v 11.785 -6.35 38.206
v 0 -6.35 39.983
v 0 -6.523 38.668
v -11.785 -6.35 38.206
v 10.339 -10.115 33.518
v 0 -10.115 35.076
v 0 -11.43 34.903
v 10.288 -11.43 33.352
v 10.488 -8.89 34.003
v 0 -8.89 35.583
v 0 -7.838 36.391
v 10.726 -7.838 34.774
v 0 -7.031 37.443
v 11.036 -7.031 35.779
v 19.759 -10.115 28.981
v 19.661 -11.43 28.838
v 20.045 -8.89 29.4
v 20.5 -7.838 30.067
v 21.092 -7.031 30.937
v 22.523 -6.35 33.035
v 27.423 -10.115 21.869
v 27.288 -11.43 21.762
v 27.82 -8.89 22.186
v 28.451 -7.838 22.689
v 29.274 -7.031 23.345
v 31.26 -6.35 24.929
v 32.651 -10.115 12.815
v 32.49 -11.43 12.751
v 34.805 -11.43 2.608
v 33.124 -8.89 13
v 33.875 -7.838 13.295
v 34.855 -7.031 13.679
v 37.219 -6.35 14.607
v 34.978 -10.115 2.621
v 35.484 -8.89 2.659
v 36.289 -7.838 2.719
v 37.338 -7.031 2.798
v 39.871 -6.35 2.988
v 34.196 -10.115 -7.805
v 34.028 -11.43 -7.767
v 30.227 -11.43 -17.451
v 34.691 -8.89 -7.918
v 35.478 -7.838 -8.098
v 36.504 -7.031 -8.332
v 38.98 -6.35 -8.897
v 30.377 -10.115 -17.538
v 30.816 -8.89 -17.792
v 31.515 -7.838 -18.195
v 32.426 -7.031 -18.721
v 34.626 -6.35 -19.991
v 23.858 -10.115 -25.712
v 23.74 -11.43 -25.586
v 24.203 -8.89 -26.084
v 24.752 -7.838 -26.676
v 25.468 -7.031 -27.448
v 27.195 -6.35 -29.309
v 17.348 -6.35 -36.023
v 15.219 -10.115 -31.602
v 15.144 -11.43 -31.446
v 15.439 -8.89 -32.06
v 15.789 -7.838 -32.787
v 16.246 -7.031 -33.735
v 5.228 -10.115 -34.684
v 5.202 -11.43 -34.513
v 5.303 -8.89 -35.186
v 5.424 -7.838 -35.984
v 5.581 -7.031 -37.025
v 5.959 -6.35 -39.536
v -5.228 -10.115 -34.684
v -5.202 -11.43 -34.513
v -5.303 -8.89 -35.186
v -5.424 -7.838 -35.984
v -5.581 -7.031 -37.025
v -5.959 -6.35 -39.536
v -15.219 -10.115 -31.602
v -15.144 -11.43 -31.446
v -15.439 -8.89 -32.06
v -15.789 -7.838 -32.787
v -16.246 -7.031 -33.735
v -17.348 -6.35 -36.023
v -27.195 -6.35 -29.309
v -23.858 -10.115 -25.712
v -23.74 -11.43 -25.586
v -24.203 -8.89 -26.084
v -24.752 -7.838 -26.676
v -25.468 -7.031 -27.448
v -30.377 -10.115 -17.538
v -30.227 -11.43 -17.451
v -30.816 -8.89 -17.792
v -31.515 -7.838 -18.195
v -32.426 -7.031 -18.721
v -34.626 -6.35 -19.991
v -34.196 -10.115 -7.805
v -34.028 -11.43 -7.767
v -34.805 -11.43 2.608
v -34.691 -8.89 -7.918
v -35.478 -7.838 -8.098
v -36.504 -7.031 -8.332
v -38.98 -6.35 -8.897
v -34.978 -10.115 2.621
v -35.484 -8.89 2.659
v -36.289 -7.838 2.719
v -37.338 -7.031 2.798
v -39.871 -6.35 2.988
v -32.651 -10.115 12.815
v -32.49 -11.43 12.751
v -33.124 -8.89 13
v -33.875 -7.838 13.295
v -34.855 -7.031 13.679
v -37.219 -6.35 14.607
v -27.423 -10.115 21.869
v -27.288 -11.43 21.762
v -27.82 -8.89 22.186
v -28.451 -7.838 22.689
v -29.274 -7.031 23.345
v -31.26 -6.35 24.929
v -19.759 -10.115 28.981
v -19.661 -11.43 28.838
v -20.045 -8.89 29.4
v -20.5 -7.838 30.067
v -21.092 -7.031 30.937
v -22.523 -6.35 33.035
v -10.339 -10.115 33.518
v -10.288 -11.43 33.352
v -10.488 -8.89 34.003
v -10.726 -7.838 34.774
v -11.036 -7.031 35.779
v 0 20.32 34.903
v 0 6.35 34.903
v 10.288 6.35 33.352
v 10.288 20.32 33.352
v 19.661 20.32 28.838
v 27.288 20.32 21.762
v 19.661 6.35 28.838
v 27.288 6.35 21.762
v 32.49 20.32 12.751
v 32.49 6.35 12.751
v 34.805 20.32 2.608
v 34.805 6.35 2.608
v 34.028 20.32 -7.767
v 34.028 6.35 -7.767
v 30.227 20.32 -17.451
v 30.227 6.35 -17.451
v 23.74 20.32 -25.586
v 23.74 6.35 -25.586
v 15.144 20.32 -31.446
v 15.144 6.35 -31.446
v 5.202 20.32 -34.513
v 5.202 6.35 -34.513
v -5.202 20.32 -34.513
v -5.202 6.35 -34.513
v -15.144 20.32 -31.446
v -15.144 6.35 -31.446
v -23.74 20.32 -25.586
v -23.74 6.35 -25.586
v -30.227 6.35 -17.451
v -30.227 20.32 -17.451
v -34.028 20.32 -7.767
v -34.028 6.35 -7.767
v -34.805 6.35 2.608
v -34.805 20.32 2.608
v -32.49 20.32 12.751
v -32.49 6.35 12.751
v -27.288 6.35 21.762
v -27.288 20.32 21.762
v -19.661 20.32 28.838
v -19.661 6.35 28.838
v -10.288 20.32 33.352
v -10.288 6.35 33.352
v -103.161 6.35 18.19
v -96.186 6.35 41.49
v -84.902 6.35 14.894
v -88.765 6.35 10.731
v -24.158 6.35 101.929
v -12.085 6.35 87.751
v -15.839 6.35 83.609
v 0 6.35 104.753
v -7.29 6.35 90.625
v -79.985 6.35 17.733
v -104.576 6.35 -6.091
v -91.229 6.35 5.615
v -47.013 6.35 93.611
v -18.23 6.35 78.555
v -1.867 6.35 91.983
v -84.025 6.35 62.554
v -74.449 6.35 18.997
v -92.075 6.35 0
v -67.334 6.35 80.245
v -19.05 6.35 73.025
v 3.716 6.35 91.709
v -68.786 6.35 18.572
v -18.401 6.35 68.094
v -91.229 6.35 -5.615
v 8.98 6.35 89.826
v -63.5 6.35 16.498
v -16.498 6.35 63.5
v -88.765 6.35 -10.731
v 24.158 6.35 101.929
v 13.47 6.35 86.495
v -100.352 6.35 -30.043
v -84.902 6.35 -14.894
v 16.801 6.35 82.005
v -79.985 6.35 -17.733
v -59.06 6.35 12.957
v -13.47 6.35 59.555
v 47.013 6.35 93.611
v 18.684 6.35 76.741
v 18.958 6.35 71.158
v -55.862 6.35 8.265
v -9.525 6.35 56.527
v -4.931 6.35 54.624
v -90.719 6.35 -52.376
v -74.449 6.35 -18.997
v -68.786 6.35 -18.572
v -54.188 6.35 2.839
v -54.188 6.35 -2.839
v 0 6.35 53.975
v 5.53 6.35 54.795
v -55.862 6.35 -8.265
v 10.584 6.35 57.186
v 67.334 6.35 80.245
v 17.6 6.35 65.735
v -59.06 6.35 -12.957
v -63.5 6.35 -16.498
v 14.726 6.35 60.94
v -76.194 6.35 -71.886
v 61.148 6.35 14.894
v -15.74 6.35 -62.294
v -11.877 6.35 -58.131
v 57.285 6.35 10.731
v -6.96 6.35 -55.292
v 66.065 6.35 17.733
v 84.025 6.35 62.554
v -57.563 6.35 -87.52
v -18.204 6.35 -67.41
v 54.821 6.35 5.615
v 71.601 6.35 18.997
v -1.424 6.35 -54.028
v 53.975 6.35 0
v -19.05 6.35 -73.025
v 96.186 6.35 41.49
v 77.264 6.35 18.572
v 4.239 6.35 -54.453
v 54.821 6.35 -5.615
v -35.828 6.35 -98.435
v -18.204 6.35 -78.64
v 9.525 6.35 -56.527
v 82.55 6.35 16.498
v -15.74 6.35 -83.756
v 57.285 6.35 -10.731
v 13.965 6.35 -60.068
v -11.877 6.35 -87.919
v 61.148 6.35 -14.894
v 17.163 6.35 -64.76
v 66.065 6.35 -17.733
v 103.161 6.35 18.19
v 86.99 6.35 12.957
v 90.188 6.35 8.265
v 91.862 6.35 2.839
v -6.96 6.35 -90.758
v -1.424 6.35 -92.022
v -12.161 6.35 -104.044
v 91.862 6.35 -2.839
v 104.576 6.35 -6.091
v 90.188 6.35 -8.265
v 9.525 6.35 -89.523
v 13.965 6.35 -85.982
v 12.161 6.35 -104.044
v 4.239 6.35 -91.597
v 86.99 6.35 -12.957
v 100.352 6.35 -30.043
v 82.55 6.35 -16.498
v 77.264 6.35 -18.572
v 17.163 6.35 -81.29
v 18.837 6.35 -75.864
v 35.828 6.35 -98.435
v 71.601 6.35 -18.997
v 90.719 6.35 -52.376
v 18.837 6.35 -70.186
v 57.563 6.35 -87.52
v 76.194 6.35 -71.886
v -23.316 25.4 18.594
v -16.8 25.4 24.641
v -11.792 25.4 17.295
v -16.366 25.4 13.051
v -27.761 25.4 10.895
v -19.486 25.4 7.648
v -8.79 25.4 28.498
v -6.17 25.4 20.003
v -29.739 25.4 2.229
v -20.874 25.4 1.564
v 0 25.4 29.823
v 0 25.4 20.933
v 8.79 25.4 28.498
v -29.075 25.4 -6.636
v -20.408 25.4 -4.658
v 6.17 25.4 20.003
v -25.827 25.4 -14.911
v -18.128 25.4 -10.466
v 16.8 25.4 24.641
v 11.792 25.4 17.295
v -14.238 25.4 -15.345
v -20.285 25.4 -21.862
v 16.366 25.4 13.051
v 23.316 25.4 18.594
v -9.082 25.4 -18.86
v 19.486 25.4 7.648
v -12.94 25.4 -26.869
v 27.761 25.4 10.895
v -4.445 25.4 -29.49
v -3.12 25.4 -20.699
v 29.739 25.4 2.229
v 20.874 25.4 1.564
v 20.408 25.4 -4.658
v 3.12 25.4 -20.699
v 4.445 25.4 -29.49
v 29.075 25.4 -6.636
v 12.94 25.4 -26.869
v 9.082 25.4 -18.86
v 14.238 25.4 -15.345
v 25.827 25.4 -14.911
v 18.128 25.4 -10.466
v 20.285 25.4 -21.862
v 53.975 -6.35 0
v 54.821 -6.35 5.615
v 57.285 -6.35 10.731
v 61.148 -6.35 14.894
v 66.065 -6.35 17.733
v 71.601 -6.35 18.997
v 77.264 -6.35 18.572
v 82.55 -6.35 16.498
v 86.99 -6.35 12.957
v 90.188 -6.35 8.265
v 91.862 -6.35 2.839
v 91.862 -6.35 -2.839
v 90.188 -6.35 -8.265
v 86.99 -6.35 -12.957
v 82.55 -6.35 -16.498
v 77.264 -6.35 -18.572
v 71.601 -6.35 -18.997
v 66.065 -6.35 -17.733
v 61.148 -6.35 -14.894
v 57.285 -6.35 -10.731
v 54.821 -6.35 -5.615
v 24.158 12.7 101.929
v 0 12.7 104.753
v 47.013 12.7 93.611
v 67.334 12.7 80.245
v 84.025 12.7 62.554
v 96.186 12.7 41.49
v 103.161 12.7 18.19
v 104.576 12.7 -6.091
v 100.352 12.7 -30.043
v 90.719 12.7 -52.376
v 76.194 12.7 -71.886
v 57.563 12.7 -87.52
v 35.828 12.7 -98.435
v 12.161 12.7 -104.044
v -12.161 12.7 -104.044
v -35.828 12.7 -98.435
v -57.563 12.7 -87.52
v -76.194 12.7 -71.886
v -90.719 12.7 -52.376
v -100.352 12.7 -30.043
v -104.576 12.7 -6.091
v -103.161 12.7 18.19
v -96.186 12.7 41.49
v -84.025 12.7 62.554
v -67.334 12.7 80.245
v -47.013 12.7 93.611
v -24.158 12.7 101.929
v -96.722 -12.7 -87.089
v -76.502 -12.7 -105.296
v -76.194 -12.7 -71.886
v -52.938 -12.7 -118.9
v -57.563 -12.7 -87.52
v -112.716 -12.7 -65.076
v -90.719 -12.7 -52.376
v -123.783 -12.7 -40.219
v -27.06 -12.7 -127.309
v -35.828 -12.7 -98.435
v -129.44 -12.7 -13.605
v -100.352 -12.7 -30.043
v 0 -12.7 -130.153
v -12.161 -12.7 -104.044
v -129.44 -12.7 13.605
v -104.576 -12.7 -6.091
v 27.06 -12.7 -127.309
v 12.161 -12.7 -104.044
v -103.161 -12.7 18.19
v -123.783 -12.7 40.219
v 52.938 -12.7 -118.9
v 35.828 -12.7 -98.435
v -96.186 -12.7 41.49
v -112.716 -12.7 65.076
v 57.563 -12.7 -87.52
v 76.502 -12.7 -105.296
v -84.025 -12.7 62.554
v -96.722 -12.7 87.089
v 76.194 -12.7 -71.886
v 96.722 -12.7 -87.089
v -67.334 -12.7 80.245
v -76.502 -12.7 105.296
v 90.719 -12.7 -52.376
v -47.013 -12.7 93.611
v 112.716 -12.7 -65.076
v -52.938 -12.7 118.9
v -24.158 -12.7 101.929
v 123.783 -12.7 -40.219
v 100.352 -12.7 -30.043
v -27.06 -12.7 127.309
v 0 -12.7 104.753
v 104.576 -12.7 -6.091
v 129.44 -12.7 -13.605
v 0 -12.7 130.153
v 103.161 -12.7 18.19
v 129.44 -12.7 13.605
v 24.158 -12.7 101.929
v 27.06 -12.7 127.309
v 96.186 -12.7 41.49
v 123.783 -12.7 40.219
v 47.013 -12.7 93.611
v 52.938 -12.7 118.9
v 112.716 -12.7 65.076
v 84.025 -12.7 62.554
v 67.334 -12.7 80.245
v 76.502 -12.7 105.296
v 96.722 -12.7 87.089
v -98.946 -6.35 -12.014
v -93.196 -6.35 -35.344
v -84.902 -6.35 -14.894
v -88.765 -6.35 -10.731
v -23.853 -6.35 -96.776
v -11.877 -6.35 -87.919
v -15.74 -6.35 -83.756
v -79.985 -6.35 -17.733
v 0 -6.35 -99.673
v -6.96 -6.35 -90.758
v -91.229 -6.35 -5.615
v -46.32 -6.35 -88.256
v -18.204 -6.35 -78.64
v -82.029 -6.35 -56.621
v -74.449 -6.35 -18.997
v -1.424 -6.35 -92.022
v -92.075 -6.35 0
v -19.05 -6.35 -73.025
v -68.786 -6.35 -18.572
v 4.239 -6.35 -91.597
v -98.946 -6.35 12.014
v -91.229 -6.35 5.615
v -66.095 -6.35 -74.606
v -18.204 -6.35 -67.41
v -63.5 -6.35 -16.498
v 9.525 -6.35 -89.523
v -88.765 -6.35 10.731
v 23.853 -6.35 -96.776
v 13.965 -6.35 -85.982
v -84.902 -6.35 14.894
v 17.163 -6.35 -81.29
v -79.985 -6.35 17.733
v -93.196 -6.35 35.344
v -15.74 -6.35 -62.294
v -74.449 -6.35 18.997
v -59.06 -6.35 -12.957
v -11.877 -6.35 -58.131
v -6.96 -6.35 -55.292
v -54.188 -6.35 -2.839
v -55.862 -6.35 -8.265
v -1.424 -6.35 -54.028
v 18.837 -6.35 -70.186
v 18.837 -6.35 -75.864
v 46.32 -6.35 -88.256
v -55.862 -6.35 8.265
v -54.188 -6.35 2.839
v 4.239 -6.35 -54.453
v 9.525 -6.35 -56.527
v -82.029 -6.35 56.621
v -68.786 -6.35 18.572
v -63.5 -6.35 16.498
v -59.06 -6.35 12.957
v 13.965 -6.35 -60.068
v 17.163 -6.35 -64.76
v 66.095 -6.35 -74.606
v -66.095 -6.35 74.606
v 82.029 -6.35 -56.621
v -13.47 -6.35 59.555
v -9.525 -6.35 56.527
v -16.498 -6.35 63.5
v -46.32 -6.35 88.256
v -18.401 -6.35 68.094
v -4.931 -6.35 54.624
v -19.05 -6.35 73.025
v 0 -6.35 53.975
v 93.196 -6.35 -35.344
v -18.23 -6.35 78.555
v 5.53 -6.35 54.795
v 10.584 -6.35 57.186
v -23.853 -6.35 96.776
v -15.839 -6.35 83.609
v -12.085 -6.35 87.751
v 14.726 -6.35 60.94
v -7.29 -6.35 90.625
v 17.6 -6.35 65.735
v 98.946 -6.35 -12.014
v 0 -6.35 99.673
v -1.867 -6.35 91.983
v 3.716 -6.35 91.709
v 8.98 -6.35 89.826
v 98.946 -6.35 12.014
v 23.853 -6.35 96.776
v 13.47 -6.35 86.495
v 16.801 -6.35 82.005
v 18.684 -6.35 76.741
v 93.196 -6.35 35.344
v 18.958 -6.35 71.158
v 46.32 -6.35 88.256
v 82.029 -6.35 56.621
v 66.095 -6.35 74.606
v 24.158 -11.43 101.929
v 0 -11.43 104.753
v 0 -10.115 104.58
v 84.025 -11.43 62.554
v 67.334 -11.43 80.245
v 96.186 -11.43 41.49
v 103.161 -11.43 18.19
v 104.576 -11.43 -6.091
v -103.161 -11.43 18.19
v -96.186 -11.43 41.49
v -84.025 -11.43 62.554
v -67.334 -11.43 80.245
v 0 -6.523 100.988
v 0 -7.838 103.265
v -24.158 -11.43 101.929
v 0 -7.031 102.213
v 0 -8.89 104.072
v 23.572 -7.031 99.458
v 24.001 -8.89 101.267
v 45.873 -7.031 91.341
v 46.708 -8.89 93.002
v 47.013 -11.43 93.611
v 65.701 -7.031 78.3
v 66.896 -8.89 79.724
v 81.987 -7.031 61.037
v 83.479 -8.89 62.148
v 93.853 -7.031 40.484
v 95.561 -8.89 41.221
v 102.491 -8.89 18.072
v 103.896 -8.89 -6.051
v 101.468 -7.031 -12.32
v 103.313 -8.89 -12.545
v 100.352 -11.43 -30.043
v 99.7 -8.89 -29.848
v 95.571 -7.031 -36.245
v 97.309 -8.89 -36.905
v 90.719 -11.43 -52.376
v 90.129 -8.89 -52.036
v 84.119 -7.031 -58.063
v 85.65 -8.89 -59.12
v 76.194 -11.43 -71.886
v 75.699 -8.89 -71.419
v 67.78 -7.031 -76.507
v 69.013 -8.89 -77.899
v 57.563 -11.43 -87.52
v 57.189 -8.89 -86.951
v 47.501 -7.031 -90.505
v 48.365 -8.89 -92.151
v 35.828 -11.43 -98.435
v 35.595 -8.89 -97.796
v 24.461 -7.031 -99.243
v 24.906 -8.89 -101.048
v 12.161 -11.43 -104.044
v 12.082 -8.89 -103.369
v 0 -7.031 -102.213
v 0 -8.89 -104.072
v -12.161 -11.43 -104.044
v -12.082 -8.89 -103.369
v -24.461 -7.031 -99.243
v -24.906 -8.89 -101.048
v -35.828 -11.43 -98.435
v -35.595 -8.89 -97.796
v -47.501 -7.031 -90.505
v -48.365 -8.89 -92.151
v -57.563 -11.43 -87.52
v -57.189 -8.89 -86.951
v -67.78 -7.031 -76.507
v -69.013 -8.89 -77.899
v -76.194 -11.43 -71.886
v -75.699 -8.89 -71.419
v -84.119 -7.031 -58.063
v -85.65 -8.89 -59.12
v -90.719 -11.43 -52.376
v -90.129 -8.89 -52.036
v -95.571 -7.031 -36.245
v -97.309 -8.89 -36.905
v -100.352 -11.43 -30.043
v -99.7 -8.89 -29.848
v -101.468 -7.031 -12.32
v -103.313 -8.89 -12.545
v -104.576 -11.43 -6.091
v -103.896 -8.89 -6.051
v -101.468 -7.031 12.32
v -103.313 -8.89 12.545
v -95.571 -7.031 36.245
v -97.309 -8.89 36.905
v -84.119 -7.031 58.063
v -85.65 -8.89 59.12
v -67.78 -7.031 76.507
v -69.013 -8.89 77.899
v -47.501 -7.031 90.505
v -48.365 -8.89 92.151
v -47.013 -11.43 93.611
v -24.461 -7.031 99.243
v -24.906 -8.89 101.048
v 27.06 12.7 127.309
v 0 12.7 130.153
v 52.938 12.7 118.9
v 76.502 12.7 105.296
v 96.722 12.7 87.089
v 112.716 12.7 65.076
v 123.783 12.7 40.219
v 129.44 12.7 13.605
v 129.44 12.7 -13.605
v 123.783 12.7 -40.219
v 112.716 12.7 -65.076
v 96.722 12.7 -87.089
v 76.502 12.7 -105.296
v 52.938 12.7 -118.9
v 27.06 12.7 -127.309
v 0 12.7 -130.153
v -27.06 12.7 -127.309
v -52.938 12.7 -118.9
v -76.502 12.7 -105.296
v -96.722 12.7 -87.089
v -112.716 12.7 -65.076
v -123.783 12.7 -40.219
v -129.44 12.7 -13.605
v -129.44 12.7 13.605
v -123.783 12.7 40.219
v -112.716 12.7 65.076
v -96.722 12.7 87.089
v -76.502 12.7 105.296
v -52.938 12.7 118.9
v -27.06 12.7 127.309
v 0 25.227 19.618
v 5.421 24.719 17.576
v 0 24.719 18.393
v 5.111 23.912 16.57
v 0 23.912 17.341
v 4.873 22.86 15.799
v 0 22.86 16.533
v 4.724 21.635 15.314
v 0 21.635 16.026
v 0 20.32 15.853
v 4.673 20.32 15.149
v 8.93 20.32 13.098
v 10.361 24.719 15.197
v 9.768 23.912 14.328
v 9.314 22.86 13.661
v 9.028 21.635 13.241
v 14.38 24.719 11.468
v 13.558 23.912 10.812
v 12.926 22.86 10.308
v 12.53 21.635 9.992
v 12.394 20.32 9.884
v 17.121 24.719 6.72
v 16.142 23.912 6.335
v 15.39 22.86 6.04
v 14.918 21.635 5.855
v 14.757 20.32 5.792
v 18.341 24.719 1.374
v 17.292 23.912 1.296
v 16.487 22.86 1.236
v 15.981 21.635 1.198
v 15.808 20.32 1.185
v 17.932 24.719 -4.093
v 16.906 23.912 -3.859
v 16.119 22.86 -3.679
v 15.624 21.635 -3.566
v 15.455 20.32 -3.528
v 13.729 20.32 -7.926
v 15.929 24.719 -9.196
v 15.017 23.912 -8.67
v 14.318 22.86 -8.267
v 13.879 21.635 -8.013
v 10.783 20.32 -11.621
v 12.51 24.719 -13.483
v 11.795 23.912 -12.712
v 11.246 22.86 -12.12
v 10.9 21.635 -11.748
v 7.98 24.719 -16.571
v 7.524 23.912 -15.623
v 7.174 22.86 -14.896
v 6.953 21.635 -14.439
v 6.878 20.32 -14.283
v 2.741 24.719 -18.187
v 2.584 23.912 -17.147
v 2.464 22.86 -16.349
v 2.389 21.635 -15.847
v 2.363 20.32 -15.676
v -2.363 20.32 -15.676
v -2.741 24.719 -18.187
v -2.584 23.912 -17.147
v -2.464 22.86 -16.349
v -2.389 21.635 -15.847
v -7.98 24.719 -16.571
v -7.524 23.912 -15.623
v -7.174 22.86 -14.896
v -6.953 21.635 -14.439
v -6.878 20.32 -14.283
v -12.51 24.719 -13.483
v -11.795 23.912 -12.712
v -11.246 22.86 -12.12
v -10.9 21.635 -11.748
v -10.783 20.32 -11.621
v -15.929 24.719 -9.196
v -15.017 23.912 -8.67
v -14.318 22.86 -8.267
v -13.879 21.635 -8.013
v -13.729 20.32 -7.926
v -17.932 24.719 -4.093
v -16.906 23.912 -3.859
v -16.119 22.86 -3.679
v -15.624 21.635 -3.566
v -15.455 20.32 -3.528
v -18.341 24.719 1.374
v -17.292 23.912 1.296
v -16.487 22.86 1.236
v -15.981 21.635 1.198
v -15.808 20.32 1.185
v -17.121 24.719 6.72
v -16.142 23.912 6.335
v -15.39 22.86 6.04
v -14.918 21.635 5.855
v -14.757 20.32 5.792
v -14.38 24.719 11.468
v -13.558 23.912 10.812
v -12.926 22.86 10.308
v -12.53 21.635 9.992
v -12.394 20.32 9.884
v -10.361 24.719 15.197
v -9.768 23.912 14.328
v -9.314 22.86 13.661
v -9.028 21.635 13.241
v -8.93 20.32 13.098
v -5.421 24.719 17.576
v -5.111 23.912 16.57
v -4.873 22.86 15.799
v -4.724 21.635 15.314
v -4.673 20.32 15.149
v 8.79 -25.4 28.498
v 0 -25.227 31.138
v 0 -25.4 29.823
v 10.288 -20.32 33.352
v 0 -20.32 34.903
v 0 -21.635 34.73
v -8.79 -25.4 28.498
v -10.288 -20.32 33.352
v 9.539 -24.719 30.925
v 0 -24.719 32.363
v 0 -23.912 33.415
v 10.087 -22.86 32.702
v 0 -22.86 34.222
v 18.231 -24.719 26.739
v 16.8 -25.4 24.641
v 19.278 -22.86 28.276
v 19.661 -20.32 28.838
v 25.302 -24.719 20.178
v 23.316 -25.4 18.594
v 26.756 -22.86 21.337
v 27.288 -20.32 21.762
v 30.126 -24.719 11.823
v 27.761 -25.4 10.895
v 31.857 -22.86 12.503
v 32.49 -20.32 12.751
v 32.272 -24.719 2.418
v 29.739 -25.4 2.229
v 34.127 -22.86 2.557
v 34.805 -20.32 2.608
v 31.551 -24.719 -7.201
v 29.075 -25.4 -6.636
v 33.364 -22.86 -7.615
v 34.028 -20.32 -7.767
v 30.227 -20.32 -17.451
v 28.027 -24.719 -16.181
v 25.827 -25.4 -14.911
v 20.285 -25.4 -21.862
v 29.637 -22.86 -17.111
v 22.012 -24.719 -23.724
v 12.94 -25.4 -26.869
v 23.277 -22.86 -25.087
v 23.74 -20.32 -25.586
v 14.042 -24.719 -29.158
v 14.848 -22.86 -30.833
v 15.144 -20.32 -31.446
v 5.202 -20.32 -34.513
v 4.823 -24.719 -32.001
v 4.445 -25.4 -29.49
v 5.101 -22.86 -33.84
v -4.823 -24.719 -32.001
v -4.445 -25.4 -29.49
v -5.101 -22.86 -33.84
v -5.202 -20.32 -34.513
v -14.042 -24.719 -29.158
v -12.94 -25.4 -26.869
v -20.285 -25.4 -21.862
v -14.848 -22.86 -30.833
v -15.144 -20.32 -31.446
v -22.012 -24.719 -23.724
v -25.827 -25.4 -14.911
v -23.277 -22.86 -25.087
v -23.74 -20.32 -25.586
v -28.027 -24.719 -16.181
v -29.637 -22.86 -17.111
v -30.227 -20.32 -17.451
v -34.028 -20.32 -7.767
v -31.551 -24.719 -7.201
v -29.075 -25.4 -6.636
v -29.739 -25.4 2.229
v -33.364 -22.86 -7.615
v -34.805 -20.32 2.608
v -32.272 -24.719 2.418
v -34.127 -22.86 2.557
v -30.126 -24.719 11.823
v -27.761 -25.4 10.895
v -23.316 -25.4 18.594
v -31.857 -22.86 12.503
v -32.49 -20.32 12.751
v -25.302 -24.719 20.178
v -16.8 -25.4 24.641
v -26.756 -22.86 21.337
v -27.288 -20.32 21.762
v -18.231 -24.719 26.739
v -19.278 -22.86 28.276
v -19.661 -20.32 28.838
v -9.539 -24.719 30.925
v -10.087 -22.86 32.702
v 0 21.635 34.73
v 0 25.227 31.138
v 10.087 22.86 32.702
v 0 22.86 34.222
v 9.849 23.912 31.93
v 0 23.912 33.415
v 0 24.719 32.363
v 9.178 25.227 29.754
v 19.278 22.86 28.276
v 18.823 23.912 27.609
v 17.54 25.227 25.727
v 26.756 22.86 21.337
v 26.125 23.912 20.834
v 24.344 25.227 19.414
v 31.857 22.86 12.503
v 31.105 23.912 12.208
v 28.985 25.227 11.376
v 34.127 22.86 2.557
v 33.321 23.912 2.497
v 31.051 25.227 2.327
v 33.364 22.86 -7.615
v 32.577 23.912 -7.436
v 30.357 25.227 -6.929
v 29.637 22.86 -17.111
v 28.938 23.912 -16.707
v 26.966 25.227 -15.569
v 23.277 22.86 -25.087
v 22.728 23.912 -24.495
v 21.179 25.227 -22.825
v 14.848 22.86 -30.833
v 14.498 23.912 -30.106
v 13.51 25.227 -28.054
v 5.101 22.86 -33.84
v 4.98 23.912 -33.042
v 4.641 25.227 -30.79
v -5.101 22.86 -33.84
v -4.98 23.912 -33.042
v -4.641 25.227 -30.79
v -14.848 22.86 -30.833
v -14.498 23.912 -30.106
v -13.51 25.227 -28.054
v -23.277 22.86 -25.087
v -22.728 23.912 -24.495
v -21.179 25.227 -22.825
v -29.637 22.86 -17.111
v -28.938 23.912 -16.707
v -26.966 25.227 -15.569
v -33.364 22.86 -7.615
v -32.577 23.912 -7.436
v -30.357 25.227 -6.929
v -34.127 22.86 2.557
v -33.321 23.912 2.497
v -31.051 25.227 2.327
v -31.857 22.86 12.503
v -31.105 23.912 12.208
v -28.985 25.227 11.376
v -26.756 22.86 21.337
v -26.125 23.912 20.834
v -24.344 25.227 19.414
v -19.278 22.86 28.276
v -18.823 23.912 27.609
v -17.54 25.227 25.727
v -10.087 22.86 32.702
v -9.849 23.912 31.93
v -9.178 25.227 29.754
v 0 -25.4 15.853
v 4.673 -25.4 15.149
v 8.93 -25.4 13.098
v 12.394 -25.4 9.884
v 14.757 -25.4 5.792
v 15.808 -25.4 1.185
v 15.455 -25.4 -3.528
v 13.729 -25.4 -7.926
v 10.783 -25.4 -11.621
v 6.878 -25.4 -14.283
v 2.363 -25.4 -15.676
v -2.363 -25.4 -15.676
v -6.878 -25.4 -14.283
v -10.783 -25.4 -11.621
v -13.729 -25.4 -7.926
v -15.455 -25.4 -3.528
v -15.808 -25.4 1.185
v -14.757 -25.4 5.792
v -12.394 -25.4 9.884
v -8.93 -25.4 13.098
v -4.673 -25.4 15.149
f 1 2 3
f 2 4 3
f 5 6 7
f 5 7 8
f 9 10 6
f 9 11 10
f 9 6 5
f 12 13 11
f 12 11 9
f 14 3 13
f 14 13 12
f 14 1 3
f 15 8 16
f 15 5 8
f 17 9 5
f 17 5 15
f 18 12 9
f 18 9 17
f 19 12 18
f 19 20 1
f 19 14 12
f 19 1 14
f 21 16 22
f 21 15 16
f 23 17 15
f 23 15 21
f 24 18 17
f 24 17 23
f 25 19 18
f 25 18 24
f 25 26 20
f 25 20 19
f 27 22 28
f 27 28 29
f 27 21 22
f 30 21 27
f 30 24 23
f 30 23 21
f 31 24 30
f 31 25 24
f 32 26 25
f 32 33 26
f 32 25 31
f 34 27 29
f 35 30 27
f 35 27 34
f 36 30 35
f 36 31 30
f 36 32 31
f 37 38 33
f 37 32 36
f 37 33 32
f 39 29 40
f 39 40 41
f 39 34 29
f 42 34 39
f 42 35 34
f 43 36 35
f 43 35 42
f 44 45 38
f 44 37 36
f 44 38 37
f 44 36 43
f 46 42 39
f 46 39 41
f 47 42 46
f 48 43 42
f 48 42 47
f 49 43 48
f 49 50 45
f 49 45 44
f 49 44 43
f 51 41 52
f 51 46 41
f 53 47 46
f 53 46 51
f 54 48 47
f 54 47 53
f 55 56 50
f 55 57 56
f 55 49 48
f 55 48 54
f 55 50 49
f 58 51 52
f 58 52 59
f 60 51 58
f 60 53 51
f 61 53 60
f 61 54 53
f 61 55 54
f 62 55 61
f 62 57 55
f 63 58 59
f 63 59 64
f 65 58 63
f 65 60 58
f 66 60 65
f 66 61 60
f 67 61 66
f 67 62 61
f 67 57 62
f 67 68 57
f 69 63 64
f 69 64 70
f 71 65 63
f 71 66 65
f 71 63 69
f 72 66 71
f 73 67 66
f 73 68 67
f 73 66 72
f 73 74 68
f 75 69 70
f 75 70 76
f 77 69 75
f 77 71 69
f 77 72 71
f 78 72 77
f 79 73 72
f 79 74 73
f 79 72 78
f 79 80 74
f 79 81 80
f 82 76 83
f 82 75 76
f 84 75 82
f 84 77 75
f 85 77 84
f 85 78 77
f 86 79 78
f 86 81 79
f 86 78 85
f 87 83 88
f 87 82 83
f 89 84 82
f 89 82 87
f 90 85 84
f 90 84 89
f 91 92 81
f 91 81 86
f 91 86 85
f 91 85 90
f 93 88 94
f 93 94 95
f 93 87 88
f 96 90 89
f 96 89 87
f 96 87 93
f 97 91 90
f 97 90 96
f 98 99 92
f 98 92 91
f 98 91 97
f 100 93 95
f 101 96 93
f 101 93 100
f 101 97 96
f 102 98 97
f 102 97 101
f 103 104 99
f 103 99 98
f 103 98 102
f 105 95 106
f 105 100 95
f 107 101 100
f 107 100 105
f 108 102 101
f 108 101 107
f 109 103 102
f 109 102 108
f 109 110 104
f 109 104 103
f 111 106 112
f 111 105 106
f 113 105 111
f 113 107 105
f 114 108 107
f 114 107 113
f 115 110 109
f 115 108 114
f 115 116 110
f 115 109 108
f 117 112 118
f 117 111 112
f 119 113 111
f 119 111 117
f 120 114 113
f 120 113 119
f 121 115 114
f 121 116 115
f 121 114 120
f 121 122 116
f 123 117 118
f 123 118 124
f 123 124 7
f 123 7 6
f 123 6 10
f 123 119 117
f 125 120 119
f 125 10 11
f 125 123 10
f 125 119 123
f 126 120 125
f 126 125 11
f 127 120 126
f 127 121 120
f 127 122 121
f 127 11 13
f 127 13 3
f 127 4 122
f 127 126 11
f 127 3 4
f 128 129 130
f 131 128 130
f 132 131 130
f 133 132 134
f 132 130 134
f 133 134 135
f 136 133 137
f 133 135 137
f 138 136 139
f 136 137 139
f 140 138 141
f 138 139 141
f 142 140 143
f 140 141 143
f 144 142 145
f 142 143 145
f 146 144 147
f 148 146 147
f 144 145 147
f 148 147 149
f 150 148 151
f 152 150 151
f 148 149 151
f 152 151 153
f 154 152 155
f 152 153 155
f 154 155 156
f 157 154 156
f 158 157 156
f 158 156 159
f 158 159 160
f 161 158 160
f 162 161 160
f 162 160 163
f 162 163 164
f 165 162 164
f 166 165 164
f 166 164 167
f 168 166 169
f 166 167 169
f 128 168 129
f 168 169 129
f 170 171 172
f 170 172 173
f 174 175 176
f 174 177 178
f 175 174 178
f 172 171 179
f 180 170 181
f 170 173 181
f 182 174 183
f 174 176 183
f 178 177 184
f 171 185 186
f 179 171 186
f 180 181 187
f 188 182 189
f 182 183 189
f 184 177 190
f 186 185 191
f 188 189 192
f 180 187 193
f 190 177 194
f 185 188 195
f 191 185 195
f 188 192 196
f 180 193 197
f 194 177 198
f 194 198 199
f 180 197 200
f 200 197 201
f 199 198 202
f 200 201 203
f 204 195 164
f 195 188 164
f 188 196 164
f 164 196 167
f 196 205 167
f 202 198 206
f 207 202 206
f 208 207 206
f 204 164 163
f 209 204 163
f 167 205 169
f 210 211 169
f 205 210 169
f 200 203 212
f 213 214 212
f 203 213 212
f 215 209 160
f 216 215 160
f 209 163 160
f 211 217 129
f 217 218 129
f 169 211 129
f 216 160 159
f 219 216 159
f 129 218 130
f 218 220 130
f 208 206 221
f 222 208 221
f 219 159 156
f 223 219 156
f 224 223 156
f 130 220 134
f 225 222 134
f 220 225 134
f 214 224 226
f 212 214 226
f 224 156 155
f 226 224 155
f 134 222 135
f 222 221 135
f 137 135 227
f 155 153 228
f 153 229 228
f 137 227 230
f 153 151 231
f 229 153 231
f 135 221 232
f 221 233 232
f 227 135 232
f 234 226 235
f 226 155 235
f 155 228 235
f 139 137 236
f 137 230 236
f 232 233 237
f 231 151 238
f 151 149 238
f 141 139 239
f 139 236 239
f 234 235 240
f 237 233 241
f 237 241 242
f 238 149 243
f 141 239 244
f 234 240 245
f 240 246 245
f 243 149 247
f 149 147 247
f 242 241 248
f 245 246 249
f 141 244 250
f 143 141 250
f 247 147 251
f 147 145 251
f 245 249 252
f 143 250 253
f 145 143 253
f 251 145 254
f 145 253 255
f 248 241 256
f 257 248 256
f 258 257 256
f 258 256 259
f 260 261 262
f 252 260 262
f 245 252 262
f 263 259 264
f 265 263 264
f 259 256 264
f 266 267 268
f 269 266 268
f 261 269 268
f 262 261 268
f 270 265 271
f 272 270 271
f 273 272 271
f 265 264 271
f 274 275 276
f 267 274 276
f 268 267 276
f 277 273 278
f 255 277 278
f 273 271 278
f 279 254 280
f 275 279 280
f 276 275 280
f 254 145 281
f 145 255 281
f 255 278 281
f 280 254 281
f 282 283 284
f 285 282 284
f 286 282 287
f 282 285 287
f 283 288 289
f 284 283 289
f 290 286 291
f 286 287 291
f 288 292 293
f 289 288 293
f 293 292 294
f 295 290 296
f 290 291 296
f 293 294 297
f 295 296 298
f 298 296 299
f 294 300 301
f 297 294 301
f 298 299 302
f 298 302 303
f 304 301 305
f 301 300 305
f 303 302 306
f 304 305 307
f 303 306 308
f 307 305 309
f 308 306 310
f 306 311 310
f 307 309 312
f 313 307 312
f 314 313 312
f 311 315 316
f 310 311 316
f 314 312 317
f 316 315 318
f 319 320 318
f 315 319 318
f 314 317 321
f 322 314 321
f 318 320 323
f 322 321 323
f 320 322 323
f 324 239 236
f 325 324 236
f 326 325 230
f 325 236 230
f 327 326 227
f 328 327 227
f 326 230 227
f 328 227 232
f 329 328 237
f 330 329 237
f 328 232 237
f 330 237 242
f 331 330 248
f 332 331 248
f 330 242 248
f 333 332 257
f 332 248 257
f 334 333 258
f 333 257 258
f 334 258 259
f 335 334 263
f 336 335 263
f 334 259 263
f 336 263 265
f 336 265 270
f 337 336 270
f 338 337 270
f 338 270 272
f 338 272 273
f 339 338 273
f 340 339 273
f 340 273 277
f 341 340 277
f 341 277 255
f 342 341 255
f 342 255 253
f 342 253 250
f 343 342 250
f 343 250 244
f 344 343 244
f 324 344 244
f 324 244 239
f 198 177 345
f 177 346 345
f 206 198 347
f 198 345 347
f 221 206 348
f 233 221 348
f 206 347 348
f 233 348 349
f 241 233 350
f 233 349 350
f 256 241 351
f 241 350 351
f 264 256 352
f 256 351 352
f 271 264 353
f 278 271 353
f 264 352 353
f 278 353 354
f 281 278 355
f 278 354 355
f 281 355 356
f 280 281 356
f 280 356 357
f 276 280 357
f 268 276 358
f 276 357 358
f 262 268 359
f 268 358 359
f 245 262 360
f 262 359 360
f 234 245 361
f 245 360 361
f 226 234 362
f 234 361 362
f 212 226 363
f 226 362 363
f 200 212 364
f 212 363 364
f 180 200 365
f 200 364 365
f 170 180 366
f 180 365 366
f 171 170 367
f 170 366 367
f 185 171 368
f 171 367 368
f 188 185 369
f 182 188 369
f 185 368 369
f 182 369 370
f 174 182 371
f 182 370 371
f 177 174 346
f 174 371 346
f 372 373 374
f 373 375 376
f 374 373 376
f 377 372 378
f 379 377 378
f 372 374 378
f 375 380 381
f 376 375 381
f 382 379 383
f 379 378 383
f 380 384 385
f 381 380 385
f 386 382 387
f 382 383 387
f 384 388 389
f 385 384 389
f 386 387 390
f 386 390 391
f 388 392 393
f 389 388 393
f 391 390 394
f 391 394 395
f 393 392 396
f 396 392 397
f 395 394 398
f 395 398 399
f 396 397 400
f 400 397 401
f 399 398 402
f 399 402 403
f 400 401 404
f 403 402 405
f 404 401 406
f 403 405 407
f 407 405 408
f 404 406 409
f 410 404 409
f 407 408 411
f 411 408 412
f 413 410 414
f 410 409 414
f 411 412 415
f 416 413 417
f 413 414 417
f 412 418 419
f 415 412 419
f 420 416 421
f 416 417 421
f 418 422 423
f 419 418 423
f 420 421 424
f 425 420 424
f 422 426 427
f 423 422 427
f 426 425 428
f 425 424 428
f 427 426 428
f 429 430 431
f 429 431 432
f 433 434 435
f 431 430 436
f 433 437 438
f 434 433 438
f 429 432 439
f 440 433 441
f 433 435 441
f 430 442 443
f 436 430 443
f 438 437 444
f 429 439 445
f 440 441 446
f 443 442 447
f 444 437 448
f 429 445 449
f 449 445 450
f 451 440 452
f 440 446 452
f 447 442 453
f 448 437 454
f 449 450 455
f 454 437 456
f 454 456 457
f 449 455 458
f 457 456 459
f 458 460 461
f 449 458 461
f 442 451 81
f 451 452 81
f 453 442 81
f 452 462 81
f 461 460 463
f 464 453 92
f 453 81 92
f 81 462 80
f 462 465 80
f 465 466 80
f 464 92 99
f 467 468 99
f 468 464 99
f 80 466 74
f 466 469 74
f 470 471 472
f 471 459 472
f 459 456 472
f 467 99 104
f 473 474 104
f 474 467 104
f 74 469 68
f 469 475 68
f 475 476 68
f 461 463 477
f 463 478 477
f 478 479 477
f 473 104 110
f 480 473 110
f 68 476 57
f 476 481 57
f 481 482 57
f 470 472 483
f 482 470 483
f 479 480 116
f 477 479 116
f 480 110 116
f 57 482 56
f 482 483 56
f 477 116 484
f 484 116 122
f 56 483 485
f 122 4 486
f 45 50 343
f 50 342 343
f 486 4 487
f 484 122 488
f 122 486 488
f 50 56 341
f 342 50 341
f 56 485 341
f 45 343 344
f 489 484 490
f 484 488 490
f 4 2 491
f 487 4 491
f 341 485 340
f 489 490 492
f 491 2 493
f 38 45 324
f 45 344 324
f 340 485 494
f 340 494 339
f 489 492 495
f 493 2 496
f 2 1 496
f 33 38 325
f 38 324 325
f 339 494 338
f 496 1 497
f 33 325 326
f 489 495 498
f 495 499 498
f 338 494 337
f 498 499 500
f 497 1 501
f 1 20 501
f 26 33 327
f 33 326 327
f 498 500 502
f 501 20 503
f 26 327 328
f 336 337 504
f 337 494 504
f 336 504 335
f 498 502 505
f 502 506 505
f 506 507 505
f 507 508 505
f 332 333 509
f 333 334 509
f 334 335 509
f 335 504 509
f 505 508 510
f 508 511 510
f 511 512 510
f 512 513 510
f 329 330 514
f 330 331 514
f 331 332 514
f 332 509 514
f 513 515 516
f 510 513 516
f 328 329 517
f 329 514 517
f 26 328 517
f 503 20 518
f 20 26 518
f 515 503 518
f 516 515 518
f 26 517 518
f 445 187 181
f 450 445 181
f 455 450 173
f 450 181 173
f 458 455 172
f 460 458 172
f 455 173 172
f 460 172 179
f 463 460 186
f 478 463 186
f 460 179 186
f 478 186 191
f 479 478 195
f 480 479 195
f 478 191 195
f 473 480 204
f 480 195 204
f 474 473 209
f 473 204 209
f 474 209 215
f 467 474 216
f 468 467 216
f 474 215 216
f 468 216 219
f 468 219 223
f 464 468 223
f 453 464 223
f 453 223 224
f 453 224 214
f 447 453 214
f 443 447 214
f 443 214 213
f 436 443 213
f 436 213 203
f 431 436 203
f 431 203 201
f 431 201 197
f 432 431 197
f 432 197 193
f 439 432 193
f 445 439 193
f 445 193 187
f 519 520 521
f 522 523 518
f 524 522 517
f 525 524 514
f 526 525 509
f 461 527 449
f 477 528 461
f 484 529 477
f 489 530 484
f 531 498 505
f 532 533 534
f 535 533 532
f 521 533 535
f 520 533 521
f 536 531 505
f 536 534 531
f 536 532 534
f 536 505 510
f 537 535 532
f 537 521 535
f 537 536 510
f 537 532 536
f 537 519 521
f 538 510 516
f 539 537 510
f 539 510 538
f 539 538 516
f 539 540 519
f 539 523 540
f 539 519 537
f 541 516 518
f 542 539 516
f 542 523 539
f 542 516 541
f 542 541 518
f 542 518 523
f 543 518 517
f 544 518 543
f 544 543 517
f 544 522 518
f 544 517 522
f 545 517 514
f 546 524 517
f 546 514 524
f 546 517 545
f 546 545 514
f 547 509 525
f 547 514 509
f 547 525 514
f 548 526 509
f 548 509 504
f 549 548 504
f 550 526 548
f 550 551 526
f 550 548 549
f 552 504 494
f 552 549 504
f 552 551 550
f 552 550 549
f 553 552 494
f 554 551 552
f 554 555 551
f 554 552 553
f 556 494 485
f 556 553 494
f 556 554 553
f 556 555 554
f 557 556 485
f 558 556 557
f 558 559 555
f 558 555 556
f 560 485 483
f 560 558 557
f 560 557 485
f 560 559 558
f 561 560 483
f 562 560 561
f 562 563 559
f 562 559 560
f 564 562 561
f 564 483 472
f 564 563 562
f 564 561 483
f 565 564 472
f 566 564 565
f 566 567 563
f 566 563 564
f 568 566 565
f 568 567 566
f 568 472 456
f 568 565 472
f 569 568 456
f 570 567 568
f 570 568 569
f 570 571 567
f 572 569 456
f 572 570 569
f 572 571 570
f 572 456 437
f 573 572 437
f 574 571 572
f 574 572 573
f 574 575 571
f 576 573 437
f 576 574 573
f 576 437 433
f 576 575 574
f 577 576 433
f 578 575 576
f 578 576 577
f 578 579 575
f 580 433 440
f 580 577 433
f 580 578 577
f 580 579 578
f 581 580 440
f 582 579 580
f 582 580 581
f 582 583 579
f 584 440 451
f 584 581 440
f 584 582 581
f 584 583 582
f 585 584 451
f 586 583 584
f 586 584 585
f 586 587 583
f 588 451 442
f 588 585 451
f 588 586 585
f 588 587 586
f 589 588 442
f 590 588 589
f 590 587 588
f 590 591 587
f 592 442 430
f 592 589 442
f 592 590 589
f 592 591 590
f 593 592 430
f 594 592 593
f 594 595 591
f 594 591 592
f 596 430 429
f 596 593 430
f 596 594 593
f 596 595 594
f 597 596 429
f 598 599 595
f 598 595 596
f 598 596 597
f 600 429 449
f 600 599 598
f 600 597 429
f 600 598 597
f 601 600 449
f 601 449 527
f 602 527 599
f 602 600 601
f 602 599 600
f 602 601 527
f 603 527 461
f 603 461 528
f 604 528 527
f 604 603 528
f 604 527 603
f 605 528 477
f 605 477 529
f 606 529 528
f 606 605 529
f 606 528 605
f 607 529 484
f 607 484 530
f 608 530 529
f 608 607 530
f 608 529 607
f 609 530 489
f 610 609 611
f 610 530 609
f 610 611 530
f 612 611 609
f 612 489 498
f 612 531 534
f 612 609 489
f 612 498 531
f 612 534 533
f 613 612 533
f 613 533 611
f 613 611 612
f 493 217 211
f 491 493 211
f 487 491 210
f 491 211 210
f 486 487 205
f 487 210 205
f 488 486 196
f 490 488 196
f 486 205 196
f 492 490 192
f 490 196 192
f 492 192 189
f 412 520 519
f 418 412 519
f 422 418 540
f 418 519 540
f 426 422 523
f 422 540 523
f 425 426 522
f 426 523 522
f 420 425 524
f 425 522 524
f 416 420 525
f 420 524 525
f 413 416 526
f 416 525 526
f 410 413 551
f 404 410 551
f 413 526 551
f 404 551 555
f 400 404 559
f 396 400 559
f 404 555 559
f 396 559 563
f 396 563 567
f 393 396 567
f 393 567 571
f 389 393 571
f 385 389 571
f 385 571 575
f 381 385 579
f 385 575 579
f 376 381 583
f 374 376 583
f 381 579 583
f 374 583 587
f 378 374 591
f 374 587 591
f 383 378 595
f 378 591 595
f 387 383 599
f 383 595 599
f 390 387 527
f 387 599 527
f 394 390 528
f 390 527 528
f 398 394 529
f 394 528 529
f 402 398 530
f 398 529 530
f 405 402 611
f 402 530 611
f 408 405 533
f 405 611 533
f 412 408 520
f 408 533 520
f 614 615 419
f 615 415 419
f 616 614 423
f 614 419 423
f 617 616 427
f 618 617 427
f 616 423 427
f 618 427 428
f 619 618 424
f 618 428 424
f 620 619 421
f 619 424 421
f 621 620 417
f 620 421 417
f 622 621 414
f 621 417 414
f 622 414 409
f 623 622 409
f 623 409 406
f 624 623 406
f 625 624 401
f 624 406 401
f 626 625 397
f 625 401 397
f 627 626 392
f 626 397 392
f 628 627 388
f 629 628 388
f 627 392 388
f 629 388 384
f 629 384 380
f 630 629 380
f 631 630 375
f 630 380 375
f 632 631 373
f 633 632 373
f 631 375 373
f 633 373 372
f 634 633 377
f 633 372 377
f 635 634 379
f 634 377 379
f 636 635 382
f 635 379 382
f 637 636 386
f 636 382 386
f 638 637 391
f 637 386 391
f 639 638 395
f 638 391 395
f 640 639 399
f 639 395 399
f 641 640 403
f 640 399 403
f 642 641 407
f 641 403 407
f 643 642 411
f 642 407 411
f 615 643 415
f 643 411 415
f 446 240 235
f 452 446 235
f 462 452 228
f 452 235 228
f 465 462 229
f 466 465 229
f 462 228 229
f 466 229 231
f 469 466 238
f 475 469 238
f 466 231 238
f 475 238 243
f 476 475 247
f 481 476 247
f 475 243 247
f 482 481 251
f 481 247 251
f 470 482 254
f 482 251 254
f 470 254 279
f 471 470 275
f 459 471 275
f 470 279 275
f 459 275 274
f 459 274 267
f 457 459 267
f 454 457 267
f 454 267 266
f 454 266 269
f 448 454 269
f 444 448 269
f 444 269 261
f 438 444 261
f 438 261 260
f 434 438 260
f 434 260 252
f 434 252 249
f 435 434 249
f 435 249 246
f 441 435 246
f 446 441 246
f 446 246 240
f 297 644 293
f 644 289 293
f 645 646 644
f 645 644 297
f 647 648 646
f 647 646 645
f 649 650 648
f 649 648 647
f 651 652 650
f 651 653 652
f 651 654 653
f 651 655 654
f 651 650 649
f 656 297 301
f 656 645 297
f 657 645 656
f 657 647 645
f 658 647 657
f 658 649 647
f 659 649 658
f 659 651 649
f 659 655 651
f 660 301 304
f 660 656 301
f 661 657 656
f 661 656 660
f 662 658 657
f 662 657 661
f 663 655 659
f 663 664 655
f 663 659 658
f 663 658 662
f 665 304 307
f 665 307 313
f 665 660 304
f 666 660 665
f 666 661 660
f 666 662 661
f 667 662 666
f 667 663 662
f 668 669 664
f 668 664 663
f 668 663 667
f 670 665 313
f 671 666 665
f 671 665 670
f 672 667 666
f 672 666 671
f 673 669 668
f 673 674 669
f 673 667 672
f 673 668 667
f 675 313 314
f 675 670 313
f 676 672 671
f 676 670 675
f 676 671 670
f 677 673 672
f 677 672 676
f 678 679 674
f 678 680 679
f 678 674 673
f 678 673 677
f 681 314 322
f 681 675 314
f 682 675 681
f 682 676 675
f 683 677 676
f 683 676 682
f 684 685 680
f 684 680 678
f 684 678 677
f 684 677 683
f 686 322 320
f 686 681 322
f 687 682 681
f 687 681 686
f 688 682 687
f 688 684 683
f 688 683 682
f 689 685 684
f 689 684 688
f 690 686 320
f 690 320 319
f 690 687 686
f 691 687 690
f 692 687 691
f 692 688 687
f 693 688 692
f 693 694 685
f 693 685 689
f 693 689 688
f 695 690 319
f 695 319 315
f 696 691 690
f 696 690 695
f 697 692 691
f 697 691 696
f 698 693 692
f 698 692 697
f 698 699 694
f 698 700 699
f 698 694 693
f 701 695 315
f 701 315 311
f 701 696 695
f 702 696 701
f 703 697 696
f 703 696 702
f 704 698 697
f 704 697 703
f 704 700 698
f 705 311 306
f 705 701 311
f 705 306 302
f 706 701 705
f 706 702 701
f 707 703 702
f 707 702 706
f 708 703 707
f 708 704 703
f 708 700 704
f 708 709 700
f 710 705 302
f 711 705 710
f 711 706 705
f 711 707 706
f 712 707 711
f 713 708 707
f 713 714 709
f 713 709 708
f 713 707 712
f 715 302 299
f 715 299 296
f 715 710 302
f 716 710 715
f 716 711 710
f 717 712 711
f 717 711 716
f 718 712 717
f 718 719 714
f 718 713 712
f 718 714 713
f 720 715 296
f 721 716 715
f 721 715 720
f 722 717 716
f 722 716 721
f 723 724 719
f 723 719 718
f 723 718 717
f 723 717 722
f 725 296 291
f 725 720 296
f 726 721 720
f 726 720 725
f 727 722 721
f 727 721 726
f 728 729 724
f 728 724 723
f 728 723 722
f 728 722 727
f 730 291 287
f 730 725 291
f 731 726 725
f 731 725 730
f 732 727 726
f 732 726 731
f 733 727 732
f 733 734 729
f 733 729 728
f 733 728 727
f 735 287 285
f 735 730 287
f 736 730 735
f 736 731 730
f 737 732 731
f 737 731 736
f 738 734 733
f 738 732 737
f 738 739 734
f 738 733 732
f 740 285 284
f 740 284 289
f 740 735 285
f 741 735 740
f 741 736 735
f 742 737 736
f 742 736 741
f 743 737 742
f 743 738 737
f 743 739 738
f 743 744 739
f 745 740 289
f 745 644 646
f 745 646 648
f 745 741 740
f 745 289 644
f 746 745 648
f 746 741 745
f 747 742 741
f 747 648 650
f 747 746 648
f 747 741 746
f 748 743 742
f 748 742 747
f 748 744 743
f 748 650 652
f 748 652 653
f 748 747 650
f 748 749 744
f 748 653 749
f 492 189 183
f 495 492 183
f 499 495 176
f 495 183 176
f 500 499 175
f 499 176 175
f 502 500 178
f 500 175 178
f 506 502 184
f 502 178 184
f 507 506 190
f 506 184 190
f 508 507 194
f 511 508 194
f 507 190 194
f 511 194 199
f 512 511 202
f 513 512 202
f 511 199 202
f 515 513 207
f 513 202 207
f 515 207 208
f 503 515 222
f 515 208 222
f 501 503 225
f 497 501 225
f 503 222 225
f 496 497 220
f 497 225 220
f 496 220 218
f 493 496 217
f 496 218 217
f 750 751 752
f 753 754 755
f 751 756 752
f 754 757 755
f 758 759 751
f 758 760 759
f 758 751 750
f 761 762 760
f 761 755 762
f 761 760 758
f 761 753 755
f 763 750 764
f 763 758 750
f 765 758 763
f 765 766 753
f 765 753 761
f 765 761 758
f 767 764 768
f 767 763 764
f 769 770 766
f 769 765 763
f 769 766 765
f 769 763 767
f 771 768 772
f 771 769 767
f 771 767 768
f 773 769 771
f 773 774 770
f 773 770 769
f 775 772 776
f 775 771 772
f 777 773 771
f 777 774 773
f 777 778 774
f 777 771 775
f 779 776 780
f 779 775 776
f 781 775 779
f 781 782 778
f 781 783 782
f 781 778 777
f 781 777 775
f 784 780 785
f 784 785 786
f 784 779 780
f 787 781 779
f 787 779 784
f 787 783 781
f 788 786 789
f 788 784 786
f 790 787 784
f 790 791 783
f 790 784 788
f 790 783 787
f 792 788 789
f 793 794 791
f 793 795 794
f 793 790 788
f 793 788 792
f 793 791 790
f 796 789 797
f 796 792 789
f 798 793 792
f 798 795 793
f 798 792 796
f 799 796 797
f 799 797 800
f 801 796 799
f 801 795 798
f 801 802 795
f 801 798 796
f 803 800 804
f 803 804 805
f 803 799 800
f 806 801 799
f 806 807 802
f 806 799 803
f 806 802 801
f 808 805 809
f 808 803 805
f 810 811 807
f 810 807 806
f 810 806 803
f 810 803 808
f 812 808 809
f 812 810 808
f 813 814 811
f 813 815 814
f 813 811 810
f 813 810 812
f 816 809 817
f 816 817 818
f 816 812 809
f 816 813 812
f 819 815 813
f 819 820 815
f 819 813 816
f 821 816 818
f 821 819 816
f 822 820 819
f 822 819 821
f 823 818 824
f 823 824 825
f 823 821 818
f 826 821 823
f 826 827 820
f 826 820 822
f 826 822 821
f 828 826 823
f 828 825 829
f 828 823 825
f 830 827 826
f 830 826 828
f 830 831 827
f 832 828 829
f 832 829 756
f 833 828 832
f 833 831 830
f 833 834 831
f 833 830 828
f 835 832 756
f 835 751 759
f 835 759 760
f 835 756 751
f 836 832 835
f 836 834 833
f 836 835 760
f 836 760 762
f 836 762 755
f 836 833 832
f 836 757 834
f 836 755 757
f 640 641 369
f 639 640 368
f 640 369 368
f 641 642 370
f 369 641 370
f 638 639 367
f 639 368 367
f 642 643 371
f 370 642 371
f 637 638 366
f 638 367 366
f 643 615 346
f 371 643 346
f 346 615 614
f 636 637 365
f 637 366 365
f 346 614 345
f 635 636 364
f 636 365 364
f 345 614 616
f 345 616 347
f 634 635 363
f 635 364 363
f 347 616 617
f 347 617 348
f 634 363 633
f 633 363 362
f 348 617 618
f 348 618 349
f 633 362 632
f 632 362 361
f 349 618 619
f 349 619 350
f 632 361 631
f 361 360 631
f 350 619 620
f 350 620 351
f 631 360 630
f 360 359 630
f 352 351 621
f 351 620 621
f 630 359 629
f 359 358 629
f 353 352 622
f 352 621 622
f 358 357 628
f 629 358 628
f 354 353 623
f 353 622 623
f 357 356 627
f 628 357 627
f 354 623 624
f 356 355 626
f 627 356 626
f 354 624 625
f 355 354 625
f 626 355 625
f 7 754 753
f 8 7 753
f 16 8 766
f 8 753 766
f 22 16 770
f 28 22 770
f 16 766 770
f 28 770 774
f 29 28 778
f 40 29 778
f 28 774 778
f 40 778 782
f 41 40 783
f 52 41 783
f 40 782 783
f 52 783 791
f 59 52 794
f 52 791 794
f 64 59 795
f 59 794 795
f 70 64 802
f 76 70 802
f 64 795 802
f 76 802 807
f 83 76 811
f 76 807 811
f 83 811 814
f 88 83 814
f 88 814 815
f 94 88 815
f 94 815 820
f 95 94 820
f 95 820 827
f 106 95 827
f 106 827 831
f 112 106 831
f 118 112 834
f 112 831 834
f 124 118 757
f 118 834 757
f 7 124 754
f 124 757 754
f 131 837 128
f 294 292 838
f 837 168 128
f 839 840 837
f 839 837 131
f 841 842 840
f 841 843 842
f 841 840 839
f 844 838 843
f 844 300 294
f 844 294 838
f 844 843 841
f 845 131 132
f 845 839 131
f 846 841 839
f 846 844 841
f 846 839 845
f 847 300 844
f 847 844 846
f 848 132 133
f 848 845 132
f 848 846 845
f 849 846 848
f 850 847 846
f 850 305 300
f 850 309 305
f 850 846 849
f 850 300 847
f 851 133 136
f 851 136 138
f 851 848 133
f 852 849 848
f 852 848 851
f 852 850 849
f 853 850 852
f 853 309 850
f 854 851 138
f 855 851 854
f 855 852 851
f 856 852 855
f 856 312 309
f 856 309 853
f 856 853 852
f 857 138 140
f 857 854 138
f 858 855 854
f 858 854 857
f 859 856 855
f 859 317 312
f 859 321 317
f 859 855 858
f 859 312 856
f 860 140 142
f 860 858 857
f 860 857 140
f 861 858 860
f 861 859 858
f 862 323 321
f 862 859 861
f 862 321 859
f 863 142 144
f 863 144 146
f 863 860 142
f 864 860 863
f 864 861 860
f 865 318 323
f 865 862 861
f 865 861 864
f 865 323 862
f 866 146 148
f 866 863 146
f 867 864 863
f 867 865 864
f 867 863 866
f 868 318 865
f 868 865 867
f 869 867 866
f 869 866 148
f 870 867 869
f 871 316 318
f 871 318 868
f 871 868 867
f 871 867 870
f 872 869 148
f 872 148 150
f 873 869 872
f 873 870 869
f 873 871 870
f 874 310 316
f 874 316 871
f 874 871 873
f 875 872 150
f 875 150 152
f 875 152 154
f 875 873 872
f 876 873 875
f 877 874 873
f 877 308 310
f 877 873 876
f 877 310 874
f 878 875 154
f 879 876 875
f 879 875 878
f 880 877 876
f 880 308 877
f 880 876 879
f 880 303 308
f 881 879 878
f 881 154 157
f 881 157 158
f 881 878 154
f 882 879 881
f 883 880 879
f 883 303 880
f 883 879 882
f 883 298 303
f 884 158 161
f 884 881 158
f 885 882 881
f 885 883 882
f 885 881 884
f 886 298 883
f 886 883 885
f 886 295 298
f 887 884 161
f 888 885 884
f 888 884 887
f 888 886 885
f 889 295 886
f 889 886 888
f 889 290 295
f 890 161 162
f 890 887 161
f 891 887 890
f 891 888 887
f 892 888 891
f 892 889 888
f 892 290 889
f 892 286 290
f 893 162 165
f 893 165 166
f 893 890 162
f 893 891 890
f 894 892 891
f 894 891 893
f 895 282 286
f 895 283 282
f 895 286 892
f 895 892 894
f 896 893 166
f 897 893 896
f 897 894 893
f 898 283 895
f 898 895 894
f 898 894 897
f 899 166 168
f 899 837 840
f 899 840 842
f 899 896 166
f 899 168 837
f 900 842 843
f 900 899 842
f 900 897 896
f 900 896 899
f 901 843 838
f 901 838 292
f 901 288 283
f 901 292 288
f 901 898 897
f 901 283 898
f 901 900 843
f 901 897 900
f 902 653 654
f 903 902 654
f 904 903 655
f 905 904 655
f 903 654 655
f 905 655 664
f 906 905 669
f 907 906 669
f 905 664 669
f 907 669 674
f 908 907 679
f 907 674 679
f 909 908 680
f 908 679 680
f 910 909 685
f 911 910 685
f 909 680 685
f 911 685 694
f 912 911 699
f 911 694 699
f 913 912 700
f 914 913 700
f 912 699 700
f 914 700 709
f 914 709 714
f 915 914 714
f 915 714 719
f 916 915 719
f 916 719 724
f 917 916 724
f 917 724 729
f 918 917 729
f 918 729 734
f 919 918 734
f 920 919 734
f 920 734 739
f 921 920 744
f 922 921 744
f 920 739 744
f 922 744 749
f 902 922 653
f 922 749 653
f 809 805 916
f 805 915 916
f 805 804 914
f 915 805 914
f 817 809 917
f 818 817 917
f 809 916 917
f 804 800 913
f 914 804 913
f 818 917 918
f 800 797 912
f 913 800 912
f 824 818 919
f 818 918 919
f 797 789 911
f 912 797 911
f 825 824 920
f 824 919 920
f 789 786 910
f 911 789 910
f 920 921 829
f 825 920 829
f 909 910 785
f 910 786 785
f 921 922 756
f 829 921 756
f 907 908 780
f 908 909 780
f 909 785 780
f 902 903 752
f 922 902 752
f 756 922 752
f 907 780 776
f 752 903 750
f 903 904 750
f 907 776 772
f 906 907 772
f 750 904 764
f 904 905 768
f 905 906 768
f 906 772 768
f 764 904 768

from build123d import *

# Parameters (mm, degrees)
F2_R     = 19.05
F3_DEPTH = 25.4
F4_R     = 5.08
F5_R     = 5.08
F6_R     = 5.08


with BuildPart() as f1:
    # F0 (on Right) → F1 (revolve)
    with BuildSketch(Plane.YZ):
        Polygon((-25.4, 34.902796), (-25.4, 15.852796), (0, 15.852796), (25.4, 15.852796), (25.4, 34.902796), (6.35, 34.902796), (6.35, 104.752796), (12.7, 104.752796), (12.7, 130.152796), (-12.7, 130.152796), (-12.7, 104.752796), (-6.35, 104.752796), (-6.35, 34.902796), align=None)
    revolve(axis=Axis((0, 11.529056, 0), (0, 1, 0)))

    # F2 (on face) → F3 (cut)
    with BuildSketch(Plane(origin=(0, 6.35, 0), x_dir=(-1, 0, 0), z_dir=(0, 1, 0))):
        with BuildLine():
            ThreePointArc((19.05, 73.025), (-13.470384, 86.495384), (0, 53.975))
            ThreePointArc((0, 53.975), (13.470384, 59.554616), (19.05, 73.025))
        make_face()
        with Locations((73.025, 0)):
            Circle(F2_R)
        with Locations((0, -73.025)):
            Circle(F2_R)
        with Locations((-73.025, 0)):
            Circle(F2_R)
    extrude(amount=-F3_DEPTH, mode=Mode.SUBTRACT)

    # F4
    f4_edges = [f1.edges().sort_by_distance(p)[0] for p in [
        (0, -25.4, -34.902796),
        (0, -6.35, -34.902796),
        (0, -15.875, 34.902796),
    ]]
    fillet(f4_edges, radius=F4_R)

    # F5
    f5_edges = [f1.edges().sort_by_distance(p)[0] for p in [
        (0, -6.35, -104.752796),
    ]]
    fillet(f5_edges, radius=F5_R)

    # F6
    f6_edges = [f1.edges().sort_by_distance(p)[0] for p in [
        (0, 25.4, -15.852796),
        (0, 25.4, -34.902796),
    ]]
    fillet(f6_edges, radius=F6_R)


solid = f1.part
